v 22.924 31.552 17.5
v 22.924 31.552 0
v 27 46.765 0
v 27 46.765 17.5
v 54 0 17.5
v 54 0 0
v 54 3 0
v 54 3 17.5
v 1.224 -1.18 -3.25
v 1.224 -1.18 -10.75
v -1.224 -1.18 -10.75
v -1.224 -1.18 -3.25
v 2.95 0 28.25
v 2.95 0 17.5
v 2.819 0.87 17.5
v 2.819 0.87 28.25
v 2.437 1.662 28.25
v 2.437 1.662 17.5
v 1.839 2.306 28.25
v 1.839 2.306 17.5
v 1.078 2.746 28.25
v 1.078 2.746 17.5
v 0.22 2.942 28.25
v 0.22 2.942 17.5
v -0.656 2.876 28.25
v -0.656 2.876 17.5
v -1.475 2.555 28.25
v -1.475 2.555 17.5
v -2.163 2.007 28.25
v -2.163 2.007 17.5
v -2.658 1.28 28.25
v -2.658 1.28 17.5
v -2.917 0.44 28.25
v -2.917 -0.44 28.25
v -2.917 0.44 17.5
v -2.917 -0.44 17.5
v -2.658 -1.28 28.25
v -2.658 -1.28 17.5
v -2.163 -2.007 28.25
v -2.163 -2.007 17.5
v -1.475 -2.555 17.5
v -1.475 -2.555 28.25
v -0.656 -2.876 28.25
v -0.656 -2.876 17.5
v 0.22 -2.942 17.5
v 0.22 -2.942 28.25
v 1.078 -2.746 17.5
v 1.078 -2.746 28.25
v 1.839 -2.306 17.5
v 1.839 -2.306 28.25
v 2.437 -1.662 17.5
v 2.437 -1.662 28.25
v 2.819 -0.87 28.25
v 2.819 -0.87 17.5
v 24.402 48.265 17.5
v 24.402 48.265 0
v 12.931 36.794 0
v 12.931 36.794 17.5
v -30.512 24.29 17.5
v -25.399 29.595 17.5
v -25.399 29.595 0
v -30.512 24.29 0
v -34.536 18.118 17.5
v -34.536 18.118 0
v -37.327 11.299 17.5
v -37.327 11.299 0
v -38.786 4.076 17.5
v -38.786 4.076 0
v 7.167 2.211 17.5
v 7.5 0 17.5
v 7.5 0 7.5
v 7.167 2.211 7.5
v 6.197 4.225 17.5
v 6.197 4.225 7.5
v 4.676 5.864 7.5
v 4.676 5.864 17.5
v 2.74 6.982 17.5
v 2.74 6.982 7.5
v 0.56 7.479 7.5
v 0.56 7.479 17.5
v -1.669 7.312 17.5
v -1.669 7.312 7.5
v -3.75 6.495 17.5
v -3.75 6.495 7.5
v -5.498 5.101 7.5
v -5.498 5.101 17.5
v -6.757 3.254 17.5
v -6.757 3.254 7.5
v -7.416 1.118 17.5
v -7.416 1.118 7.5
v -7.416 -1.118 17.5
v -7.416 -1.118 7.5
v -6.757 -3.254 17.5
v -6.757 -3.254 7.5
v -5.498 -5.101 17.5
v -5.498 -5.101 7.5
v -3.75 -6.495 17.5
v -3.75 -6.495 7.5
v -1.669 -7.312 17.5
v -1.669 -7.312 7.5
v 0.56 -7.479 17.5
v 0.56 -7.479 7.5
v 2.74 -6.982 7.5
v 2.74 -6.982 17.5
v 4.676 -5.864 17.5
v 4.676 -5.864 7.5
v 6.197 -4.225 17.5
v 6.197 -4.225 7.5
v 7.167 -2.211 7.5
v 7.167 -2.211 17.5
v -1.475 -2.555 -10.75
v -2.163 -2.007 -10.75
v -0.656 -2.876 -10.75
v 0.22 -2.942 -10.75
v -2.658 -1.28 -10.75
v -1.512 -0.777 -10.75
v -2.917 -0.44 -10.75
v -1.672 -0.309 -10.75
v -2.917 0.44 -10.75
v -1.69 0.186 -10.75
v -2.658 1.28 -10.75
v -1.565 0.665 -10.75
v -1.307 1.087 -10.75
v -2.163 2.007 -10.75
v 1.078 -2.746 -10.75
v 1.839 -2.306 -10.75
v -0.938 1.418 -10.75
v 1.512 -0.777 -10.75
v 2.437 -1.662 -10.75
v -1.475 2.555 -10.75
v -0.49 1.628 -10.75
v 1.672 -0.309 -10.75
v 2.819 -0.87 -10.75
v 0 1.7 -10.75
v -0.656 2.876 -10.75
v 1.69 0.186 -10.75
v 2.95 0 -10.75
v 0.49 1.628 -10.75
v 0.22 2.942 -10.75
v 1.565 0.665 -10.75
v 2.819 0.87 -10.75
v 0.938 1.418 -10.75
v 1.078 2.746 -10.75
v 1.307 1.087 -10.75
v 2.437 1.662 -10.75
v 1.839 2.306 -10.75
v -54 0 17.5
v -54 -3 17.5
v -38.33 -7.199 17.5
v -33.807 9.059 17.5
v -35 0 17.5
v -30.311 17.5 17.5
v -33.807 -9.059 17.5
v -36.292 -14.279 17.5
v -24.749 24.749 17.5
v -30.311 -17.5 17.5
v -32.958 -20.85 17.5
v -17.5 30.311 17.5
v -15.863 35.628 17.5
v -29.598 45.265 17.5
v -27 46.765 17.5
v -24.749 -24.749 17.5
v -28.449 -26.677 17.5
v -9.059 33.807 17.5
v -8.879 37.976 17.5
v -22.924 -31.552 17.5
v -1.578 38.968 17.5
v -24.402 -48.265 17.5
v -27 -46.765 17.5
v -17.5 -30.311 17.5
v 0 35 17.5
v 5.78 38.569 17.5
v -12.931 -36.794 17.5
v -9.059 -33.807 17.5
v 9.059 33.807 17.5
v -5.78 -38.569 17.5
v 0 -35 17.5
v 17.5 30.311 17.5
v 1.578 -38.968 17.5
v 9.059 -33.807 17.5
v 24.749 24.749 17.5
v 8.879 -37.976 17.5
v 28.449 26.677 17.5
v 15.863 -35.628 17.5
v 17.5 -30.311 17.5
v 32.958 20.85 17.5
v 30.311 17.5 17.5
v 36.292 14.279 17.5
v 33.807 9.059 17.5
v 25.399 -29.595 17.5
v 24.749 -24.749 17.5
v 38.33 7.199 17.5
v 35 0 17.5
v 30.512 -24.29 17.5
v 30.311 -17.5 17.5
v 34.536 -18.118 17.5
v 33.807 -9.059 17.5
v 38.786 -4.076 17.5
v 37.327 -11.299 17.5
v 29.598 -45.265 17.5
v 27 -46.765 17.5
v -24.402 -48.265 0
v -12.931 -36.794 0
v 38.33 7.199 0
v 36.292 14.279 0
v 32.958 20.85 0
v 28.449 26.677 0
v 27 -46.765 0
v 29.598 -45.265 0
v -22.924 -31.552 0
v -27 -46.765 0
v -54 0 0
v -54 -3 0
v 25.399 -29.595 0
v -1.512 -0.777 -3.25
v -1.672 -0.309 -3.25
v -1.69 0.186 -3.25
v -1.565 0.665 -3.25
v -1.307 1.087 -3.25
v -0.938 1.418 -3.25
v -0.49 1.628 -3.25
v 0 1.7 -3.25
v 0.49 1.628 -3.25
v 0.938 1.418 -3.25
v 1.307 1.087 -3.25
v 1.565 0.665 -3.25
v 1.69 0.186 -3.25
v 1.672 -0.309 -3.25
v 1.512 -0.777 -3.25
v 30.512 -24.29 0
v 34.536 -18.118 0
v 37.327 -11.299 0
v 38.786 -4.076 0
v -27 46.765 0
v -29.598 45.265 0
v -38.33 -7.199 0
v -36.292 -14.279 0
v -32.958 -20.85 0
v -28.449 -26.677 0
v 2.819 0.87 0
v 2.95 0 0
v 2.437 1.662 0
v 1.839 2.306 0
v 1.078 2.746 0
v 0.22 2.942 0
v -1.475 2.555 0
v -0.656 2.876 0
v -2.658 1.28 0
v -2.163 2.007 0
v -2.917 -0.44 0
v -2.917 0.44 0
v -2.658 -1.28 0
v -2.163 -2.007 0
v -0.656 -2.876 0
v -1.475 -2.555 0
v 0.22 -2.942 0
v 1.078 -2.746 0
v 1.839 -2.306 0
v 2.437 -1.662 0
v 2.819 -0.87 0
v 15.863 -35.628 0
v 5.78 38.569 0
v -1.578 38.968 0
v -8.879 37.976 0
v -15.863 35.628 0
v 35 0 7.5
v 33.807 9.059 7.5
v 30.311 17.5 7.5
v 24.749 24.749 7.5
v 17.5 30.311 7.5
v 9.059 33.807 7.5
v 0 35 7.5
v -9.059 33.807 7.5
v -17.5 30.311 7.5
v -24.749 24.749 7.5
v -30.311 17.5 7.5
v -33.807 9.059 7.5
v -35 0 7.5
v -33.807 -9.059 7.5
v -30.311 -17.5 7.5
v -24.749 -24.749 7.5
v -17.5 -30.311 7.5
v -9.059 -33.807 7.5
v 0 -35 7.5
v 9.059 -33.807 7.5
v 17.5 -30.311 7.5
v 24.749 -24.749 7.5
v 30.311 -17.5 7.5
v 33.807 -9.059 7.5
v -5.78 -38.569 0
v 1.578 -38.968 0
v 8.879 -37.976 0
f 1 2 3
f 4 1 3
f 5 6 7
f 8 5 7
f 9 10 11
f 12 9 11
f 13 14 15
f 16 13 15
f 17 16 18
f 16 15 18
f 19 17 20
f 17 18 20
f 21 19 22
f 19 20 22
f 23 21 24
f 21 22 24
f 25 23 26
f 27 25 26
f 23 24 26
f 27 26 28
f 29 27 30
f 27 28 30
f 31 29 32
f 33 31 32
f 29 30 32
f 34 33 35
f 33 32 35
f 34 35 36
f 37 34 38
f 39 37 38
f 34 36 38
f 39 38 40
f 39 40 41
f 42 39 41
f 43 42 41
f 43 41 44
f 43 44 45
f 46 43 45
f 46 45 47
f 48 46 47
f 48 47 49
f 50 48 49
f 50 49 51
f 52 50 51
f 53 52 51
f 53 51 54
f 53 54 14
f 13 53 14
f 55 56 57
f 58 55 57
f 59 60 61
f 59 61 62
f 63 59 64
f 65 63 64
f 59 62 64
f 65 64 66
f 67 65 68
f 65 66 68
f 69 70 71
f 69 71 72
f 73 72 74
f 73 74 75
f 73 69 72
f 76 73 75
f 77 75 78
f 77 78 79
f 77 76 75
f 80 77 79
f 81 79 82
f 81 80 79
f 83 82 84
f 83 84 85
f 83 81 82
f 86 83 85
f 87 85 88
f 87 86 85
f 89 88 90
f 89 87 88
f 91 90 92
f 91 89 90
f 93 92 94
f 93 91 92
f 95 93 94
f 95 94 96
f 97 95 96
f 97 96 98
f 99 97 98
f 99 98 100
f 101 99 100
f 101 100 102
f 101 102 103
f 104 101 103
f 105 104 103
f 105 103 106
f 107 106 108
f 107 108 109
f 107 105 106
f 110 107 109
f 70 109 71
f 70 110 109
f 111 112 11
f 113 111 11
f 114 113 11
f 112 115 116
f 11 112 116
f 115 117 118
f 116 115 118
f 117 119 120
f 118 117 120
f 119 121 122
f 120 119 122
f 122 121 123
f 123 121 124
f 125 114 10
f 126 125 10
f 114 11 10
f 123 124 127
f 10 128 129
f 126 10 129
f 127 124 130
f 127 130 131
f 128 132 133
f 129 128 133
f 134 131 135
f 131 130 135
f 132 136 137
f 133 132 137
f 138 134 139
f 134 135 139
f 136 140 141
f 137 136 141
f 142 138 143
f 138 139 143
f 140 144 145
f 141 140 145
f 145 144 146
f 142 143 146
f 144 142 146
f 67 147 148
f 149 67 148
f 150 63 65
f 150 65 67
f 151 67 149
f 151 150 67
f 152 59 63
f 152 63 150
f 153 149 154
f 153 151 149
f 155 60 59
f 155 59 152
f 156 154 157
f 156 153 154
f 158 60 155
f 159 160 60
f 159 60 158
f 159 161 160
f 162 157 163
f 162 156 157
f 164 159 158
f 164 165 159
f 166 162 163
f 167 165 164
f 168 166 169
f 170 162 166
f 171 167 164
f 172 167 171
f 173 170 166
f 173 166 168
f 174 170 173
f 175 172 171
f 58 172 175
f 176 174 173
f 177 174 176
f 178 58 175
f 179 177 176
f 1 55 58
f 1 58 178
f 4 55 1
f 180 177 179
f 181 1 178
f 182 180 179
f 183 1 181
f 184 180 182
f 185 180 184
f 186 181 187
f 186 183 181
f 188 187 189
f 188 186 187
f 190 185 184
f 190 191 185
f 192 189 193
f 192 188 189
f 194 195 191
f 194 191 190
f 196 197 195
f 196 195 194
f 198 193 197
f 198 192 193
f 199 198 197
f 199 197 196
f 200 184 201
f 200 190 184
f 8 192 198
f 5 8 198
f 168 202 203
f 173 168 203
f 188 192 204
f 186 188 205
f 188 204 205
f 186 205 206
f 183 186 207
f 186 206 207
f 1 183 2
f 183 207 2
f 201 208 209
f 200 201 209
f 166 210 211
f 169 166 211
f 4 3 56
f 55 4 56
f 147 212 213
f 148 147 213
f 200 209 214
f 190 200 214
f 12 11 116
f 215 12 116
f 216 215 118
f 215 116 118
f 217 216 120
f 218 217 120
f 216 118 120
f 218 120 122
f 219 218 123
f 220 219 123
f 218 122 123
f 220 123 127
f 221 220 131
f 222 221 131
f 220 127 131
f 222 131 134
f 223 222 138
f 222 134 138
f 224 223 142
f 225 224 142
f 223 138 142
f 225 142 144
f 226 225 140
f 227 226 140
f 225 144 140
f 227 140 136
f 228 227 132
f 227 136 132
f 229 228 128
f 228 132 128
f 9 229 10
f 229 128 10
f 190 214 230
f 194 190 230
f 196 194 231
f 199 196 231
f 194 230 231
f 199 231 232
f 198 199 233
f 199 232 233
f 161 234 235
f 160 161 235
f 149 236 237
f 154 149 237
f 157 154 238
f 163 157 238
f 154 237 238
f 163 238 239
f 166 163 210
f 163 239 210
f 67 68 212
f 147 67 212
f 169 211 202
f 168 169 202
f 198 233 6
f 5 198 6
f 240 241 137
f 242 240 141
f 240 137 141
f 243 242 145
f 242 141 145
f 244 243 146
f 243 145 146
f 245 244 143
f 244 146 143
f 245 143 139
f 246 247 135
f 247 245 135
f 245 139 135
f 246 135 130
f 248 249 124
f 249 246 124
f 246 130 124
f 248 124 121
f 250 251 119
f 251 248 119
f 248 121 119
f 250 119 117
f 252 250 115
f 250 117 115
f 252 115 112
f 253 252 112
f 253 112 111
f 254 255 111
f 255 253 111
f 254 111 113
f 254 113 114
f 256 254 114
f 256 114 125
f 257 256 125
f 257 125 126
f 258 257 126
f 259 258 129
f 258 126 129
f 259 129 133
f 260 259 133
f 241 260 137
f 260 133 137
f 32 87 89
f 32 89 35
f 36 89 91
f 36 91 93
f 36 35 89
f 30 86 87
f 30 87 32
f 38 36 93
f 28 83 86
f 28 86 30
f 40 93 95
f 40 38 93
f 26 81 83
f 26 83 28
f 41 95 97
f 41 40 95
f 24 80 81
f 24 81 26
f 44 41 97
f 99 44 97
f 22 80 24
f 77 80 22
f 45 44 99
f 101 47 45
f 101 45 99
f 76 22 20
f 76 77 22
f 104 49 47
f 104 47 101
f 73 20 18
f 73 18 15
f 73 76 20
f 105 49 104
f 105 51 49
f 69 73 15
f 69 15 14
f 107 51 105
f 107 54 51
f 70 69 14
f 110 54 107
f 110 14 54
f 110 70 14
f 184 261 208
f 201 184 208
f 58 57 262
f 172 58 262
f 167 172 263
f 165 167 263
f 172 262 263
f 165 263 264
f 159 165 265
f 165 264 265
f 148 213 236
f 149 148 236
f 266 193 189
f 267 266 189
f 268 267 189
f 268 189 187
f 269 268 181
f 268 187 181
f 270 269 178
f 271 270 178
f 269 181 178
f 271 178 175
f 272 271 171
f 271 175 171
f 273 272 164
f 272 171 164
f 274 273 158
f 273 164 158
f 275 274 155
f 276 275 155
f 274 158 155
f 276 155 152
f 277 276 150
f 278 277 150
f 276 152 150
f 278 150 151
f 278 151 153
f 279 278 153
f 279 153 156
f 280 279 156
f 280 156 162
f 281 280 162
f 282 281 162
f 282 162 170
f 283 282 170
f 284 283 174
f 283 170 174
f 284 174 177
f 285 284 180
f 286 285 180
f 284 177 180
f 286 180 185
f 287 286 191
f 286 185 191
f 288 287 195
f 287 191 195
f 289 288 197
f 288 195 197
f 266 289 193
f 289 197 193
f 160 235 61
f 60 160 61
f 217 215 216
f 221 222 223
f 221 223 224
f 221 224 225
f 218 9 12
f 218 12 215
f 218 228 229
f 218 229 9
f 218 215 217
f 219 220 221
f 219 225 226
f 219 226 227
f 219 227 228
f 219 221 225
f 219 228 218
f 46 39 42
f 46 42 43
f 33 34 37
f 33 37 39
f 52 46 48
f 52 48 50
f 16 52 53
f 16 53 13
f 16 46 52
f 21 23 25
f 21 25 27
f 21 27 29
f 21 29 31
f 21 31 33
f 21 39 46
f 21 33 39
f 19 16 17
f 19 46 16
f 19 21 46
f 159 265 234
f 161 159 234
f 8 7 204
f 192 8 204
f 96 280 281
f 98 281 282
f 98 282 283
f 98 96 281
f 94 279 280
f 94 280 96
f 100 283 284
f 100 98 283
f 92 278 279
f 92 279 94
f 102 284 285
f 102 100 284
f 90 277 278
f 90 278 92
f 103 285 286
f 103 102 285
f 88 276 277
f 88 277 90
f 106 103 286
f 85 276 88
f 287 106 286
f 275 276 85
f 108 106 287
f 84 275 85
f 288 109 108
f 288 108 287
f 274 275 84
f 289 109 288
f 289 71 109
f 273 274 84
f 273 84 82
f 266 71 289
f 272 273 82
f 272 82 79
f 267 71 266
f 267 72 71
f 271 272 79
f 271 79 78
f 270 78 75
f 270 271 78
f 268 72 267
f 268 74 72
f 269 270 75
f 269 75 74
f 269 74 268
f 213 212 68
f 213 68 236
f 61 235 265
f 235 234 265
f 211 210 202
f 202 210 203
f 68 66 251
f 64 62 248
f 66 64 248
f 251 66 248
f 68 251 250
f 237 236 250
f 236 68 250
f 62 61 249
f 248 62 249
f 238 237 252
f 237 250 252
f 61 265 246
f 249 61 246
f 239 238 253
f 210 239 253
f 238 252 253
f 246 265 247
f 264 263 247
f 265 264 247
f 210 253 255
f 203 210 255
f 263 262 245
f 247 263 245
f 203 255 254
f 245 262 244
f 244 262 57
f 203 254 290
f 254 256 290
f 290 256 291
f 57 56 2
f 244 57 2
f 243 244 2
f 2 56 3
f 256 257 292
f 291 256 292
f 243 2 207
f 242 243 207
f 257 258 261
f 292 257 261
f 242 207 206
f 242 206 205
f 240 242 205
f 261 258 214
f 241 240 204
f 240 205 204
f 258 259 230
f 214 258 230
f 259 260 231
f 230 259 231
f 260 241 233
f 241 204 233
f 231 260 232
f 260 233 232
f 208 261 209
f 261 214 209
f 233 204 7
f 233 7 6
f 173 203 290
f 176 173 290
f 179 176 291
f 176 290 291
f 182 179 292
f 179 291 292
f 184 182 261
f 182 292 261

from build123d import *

# Parameters (mm, degrees)
SKETCH1_R                = 39
BOSS_EXTRUDE1_DEPTH      = 17.5
BOSS_EXTRUDE5_DEPTH      = 10.75
BOSS_EXTRUDE5_DEPTH_BACK = 28.25
SKETCH3_R                = 2.95
CUT_EXTRUDE1_START       = 10.75
CUT_EXTRUDE1_DEPTH       = 7.5
CIRPATTERN1_COUNT        = 6
SKETCH4_R                = 35
SKETCH4_R_2              = 7.5
CUT_EXTRUDE2_DEPTH       = 10


with BuildPart() as part:
    # Sketch1 → Boss-Extrude1 (new body)
    with BuildSketch(Plane.XY):
        Circle(SKETCH1_R)
        with BuildLine():
            Line((-54, 0), (-54, -3))
            Line((-54, -3), (-38.329847519, -7.198804702))
            ThreePointArc((-38.329847519, -7.198804702), (-38.968072448, -1.577760972), (-38.786367534, 4.076480533))
            Line((-38.786367534, 4.076480533), (-54, 0))
        make_face()
        with BuildLine():
            ThreePointArc((-38.786367534, 4.076480533), (-38.968072448, -1.577760972), (-38.329847519, -7.198804702))
            ThreePointArc((-38.329847519, -7.198804702), (3.614965197, -38.832100466), (39, 0))
            ThreePointArc((39, 0), (2.041037259, 38.946555264), (-38.786367534, 4.076480533))
        make_face()
    boss_extrude1 = extrude(amount=BOSS_EXTRUDE1_DEPTH)

    # Sketch3 → Boss-Extrude5 (add, two sides: drawn at the far end of the back side and taken through both)
    with BuildSketch(Plane.XY.offset(17.5).offset(-BOSS_EXTRUDE5_DEPTH_BACK)):
        Circle(SKETCH3_R)
    extrude(amount=BOSS_EXTRUDE5_DEPTH + BOSS_EXTRUDE5_DEPTH_BACK)

    # Sketch2 → Cut-Extrude1 (cut)
    with BuildSketch(Plane(origin=(0, 0, 0), x_dir=(-1, 0, 0), z_dir=(0, 0, -1)).offset(CUT_EXTRUDE1_START)):
        with BuildLine():
            Line((-1.223764683, -1.18), (1.223764683, -1.18))
            ThreePointArc((1.223764683, -1.18), (0, 1.7), (-1.223764683, -1.18))
        make_face()
    extrude(amount=-CUT_EXTRUDE1_DEPTH, mode=Mode.SUBTRACT)

    # CirPattern1: Boss-Extrude1 ×6 about axis
    cirpattern1_axis = Axis((0, 0, 0), (0, 0, 1))
    for i in range(1, CIRPATTERN1_COUNT):
        add(boss_extrude1.rotate(cirpattern1_axis, i * 360 / CIRPATTERN1_COUNT))

    # Sketch4 → Cut-Extrude2 (cut)
    with BuildSketch(Plane.XY.offset(17.5)):
        Circle(SKETCH4_R)
        Circle(SKETCH4_R_2, mode=Mode.SUBTRACT)
    extrude(amount=-CUT_EXTRUDE2_DEPTH, mode=Mode.SUBTRACT)


solid = part.part
